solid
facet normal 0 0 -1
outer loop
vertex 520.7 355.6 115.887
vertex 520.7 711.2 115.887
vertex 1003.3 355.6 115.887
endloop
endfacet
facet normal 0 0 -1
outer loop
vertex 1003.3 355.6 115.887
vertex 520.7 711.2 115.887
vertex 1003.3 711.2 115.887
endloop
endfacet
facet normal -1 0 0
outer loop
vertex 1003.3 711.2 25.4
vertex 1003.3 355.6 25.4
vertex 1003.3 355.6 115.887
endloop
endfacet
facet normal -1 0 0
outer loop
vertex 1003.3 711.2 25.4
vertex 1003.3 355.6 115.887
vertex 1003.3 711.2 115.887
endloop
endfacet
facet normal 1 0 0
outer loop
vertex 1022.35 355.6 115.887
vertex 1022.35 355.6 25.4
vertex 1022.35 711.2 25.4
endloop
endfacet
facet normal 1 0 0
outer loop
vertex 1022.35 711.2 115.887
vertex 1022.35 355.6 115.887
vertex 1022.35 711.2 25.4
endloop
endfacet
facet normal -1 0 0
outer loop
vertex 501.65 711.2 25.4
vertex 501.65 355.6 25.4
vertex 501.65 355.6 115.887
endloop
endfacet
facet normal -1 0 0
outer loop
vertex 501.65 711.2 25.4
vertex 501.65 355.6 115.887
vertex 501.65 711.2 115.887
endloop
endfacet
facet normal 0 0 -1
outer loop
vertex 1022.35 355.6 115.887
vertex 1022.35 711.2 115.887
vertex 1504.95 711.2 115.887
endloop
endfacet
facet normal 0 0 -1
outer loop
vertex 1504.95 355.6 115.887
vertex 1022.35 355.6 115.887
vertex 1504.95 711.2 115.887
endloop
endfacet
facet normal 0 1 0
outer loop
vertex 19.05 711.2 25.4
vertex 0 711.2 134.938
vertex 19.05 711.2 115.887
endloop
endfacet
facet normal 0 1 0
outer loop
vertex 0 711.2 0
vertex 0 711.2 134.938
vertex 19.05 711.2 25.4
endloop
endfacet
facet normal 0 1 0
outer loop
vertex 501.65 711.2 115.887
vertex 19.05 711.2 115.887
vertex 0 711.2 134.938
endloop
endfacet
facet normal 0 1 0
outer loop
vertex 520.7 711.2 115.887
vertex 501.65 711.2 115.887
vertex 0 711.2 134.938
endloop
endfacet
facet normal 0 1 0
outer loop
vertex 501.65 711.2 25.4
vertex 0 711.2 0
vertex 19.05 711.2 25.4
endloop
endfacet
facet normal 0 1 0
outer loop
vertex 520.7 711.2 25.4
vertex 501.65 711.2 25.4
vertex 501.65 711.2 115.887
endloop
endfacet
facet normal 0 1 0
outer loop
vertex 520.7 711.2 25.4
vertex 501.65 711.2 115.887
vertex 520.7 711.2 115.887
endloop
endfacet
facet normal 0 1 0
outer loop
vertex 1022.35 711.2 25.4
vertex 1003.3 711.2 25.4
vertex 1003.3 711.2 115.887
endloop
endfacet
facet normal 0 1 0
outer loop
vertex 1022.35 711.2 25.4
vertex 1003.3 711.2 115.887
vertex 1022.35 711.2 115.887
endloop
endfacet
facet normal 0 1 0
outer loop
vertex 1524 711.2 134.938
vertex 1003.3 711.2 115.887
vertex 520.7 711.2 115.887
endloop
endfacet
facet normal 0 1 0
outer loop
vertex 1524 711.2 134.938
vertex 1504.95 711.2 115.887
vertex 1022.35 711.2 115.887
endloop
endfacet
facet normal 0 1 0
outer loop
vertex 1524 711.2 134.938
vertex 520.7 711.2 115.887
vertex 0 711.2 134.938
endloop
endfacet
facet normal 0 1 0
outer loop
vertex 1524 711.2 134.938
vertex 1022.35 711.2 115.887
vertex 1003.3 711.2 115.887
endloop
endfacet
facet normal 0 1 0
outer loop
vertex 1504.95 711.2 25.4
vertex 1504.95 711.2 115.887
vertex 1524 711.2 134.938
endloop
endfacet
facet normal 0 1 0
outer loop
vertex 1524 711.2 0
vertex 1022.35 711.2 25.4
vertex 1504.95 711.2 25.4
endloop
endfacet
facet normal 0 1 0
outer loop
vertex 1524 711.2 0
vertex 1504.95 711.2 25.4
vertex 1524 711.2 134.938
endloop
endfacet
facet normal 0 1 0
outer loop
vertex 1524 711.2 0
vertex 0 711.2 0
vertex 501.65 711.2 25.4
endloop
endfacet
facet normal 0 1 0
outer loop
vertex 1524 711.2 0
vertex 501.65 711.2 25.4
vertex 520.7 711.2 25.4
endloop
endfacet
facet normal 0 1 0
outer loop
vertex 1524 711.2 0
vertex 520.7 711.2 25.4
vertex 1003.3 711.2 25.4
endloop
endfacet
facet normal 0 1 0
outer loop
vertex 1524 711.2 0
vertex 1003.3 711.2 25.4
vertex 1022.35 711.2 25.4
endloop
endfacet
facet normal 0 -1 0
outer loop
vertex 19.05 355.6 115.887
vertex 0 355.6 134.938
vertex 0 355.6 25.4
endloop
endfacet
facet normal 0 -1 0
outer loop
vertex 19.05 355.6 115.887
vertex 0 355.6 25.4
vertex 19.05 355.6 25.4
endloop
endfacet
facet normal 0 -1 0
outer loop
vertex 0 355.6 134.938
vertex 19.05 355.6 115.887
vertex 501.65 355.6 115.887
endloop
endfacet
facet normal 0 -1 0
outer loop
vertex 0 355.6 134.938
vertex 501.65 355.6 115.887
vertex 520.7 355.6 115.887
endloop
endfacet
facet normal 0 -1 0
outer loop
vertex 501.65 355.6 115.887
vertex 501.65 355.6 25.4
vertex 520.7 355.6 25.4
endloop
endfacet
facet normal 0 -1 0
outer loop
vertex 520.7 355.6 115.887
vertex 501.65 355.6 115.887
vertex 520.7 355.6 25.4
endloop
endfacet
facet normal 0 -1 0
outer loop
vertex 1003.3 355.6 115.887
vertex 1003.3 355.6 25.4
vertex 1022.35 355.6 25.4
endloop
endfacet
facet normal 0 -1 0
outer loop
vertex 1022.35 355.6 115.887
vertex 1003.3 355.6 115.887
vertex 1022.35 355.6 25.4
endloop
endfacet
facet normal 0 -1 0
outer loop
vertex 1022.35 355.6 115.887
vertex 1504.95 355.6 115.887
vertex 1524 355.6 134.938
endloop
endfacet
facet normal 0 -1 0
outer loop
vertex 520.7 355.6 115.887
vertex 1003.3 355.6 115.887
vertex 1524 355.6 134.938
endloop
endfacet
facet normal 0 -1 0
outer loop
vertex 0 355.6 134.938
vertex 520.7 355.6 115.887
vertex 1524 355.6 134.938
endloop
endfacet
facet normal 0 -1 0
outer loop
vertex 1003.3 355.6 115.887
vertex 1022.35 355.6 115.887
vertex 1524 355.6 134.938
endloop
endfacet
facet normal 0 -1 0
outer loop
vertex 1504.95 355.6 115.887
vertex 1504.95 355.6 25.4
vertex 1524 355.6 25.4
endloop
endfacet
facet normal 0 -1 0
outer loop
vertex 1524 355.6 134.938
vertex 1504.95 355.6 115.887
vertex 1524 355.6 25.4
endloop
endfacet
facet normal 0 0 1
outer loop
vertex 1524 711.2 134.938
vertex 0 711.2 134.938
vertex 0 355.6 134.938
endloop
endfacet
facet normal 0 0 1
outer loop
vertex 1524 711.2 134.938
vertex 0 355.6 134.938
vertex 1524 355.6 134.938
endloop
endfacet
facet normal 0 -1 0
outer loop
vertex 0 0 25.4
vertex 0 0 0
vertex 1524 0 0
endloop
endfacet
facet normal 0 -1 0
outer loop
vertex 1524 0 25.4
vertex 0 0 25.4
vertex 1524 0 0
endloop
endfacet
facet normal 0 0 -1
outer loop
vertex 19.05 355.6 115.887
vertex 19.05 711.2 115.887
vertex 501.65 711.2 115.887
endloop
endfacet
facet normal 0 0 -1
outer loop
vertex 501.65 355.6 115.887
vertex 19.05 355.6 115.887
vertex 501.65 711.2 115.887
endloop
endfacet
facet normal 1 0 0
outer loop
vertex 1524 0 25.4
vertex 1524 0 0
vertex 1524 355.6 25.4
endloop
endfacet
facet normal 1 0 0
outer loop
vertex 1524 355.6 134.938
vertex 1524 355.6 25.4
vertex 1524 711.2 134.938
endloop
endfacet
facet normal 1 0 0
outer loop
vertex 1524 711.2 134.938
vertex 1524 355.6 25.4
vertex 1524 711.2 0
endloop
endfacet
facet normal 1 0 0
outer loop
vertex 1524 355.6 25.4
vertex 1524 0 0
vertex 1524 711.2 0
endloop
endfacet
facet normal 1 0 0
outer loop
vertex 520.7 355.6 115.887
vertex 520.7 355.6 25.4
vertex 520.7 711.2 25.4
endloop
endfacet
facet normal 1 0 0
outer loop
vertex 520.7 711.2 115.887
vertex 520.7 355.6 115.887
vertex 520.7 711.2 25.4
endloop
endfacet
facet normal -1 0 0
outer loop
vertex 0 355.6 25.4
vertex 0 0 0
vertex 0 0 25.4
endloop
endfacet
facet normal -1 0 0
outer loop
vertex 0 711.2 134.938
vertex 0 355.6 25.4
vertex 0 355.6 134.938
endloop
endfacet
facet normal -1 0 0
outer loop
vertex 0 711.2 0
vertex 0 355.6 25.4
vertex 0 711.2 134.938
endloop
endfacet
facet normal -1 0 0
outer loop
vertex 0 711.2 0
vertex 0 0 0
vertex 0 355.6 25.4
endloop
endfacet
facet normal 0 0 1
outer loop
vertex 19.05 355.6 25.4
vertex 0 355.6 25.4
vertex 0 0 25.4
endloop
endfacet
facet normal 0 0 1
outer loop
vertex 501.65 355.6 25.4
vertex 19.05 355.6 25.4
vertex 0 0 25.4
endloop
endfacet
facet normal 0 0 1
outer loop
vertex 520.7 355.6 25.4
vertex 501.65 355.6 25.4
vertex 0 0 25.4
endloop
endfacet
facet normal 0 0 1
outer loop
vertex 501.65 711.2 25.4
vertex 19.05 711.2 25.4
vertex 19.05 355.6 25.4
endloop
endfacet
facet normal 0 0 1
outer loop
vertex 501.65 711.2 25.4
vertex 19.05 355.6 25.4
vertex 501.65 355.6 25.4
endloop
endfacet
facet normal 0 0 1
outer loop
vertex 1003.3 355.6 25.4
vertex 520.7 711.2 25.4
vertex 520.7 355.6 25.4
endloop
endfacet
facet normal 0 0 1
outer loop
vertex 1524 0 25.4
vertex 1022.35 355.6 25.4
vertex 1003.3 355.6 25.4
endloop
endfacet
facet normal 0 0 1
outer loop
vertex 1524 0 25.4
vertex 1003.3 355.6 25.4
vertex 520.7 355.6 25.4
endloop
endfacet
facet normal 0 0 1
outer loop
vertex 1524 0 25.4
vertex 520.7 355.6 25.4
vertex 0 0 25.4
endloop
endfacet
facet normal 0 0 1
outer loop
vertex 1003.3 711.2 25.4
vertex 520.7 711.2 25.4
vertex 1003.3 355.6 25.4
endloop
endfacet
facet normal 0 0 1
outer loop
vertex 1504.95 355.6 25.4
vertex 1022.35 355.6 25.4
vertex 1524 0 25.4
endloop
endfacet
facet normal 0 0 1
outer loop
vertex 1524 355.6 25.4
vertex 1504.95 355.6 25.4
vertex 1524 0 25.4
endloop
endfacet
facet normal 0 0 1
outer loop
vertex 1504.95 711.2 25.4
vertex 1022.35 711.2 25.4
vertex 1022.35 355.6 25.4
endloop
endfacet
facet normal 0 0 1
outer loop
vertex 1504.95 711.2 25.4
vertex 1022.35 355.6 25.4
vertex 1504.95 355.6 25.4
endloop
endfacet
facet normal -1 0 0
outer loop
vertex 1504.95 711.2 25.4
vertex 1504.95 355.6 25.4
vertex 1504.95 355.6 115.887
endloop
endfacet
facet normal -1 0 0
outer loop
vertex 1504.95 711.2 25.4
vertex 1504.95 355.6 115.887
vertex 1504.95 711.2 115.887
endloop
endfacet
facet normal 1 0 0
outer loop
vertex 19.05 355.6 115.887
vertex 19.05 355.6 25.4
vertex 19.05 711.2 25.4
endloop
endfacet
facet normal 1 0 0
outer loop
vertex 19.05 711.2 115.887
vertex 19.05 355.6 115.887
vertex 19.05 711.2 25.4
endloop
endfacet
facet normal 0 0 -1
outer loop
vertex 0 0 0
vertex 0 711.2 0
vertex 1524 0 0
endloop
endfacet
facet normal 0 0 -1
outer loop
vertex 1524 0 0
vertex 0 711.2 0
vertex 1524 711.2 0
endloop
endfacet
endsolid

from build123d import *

# Parameters (mm, degrees)
F0_W     = 1524
F0_H     = 711.2
F1_DEPTH = 25.4
F2_W     = 19.05
F2_H     = 355.6
F3_DEPTH = 90.4875
F4_W     = 1524
F4_H     = 355.6
F5_DEPTH = 19.05


with BuildPart() as f1:
    # F0 (on Top) → F1 (new body)
    with BuildSketch(Plane.XY):
        with Locations((762, 355.6)):
            Rectangle(F0_W, F0_H)
    extrude(amount=F1_DEPTH)

    # F2 (on face) → F3 (join)
    with BuildSketch(Plane.XY.offset(25.4)):
        with Locations((9.525, 533.4)):
            Rectangle(F2_W, F2_H)
        with Locations((511.175, 533.4)):
            Rectangle(F2_W, F2_H)
        with Locations((1012.825, 533.4)):
            Rectangle(F2_W, F2_H)
        with Locations((1514.475, 533.4)):
            Rectangle(F2_W, F2_H)
    extrude(amount=F3_DEPTH)

    # F4 (on face) → F5 (join)
    with BuildSketch(Plane.XY.offset(115.8875)):
        with Locations((762, 533.4)):
            Rectangle(F4_W, F4_H)
    extrude(amount=F5_DEPTH)


solid = f1.part
